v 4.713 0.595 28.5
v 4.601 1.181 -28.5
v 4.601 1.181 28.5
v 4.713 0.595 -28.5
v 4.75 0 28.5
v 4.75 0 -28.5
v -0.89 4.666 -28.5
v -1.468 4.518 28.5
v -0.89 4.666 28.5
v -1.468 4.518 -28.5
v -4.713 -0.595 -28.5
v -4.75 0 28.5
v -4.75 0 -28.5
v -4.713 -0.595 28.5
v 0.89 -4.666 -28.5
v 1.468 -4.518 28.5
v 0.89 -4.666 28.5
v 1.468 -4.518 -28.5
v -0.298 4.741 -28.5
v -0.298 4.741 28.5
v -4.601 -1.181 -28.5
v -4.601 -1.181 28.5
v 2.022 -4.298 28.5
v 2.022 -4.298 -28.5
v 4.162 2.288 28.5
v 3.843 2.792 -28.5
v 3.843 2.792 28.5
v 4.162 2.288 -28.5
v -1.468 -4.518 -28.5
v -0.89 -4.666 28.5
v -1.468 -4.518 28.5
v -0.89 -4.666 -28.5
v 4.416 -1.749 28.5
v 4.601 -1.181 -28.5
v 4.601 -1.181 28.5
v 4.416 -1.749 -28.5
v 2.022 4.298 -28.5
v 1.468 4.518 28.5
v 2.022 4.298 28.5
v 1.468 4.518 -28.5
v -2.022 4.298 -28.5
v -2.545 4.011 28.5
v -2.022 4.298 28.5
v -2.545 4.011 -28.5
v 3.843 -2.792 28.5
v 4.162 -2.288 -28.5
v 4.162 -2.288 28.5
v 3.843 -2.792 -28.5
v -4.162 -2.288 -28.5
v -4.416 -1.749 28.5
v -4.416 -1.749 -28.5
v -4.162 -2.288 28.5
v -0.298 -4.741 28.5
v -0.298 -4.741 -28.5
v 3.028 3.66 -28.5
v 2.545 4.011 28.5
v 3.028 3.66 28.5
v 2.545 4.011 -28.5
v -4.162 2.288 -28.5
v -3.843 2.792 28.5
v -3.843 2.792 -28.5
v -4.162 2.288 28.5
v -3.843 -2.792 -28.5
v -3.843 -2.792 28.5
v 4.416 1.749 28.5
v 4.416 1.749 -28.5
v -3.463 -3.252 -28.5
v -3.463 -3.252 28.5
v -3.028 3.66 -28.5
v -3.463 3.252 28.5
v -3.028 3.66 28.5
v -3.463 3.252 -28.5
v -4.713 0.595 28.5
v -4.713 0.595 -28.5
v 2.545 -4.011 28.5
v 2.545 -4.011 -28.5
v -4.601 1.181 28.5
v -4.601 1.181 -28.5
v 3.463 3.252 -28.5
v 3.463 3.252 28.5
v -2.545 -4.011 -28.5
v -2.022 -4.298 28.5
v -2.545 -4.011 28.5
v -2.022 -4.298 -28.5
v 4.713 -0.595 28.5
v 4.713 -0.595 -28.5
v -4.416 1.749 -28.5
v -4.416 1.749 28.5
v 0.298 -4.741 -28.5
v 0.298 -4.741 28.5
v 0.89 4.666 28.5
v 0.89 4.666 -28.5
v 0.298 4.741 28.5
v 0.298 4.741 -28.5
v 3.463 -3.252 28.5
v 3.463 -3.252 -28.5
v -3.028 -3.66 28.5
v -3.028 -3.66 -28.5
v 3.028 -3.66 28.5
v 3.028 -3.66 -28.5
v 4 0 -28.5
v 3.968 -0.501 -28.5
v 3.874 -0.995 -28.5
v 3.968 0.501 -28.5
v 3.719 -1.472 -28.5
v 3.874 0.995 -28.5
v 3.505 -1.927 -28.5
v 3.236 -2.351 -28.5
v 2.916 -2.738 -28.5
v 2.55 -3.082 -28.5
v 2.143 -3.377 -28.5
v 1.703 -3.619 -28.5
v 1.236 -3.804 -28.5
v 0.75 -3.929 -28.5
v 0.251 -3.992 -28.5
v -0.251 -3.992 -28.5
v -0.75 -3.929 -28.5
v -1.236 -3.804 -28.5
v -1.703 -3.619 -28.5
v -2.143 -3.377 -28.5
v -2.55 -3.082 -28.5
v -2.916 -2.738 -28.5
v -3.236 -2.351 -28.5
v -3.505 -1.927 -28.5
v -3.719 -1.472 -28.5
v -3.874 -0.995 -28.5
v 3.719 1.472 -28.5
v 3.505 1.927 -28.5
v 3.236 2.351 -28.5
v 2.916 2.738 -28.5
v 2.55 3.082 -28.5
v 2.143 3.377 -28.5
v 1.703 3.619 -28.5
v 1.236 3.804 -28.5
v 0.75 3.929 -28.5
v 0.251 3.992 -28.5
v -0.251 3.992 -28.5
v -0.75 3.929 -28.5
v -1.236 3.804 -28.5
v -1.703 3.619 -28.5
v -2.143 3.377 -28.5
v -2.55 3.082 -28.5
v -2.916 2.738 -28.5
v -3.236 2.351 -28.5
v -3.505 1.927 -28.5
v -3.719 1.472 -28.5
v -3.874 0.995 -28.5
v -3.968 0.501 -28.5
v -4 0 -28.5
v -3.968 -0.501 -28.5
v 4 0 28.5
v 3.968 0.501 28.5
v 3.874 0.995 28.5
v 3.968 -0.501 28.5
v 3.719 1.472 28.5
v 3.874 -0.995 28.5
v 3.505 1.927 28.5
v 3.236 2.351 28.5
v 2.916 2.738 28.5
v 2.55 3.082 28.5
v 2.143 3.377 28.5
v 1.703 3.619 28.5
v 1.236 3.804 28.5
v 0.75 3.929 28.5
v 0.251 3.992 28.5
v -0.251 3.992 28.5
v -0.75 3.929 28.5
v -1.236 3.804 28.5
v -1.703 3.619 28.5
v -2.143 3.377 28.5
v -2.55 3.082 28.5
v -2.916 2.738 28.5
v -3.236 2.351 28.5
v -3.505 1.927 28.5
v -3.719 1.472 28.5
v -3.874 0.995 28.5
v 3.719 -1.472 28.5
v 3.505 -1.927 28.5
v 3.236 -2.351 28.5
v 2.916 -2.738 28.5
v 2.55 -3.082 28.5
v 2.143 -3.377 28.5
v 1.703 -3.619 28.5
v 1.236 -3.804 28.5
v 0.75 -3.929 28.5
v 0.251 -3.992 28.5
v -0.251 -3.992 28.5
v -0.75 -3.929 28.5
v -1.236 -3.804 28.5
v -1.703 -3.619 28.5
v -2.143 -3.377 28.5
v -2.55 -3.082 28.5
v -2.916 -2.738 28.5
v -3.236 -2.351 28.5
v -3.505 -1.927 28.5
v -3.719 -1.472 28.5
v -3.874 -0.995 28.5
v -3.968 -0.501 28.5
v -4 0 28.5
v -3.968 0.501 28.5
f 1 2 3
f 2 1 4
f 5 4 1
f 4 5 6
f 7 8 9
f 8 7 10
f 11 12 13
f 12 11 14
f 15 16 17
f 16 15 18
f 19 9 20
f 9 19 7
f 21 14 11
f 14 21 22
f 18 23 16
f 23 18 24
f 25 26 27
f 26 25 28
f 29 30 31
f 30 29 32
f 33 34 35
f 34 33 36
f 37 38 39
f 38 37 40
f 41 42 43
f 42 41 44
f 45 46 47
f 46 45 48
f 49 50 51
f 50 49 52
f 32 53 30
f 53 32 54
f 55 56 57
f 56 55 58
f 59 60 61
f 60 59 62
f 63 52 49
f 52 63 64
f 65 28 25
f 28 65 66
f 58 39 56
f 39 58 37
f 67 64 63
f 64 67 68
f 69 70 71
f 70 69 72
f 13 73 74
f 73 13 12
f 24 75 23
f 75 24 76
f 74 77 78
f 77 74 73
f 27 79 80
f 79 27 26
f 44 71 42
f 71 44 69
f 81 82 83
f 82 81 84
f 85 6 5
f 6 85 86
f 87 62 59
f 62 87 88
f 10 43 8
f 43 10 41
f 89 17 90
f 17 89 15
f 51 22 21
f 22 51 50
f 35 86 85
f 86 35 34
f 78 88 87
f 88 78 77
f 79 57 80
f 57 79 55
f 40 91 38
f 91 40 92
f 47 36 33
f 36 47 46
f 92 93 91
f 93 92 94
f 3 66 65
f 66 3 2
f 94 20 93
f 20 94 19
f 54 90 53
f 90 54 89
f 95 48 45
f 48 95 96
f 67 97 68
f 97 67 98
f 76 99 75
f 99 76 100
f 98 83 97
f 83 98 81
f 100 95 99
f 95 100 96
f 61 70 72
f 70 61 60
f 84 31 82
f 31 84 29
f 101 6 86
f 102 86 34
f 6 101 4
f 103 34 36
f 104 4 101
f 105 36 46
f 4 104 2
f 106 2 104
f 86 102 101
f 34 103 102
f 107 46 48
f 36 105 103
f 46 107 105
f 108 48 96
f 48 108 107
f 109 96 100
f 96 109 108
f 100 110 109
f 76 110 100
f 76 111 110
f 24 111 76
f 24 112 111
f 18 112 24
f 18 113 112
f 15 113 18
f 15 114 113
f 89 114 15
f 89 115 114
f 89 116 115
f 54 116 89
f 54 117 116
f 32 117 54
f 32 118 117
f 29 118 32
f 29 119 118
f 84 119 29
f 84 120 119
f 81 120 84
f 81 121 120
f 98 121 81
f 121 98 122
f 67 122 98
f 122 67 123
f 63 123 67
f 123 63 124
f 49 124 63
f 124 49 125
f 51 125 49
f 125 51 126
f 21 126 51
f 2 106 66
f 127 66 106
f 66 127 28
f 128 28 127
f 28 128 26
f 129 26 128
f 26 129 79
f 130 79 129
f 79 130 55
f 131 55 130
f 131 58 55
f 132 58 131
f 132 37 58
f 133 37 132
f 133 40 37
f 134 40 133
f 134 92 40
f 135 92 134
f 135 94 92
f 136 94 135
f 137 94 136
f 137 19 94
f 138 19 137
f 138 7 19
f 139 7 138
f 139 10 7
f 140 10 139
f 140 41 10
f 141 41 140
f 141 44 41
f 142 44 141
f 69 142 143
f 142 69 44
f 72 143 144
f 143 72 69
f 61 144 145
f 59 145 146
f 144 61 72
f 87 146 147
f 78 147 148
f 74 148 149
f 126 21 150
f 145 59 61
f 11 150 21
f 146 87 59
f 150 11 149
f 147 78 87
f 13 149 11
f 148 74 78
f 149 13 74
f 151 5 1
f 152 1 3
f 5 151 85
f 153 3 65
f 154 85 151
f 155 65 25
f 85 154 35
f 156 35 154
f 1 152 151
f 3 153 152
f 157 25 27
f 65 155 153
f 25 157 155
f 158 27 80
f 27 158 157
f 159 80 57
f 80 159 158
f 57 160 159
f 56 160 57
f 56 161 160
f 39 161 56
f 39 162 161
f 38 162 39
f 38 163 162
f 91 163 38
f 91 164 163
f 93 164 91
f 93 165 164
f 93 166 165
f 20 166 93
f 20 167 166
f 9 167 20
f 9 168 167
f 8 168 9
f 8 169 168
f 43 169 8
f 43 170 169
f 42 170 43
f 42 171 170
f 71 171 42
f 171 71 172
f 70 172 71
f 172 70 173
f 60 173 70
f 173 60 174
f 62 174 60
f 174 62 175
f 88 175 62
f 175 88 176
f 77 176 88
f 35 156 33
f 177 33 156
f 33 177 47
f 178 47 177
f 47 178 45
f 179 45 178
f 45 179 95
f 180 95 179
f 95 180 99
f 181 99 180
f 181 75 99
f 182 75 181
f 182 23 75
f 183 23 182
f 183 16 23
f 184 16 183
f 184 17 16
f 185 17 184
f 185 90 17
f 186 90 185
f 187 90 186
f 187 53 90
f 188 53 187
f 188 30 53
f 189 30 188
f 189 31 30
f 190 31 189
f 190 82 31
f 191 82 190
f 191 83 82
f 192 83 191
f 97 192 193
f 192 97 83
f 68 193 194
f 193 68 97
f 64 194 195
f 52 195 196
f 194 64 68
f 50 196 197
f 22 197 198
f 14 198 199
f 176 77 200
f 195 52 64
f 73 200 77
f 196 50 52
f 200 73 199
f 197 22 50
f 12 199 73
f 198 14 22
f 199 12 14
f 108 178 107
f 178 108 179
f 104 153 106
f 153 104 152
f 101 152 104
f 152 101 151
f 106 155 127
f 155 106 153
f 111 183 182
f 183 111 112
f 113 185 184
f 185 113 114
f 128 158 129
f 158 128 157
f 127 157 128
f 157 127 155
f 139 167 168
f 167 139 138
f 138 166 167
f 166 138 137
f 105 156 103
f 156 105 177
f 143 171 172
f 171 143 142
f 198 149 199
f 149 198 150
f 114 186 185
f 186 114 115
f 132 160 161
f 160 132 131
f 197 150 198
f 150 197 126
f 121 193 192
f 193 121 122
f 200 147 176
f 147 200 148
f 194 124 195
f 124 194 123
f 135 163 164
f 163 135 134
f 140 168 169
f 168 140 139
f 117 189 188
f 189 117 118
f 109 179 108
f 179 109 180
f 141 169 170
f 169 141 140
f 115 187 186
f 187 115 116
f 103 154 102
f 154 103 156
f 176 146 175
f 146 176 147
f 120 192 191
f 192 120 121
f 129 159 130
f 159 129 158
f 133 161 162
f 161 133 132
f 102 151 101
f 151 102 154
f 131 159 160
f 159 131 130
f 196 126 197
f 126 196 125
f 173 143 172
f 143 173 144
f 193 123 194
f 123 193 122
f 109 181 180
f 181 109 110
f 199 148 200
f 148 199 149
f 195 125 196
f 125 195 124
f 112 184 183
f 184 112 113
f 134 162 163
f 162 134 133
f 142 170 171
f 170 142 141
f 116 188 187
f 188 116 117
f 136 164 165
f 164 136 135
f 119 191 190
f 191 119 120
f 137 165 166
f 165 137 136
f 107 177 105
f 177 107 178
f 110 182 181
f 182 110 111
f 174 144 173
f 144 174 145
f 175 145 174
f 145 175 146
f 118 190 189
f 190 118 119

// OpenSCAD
$fn = 50;


difference() {
	union() {
		translate(v = [0, 0, -28.5000000000]) {
			cylinder(h = 57, r = 4.7500000000);
		}
	}
	union() {
		translate(v = [0, 0, -100.0000000000]) {
			cylinder(h = 200, r = 4.0000000000);
		}
	}
}
